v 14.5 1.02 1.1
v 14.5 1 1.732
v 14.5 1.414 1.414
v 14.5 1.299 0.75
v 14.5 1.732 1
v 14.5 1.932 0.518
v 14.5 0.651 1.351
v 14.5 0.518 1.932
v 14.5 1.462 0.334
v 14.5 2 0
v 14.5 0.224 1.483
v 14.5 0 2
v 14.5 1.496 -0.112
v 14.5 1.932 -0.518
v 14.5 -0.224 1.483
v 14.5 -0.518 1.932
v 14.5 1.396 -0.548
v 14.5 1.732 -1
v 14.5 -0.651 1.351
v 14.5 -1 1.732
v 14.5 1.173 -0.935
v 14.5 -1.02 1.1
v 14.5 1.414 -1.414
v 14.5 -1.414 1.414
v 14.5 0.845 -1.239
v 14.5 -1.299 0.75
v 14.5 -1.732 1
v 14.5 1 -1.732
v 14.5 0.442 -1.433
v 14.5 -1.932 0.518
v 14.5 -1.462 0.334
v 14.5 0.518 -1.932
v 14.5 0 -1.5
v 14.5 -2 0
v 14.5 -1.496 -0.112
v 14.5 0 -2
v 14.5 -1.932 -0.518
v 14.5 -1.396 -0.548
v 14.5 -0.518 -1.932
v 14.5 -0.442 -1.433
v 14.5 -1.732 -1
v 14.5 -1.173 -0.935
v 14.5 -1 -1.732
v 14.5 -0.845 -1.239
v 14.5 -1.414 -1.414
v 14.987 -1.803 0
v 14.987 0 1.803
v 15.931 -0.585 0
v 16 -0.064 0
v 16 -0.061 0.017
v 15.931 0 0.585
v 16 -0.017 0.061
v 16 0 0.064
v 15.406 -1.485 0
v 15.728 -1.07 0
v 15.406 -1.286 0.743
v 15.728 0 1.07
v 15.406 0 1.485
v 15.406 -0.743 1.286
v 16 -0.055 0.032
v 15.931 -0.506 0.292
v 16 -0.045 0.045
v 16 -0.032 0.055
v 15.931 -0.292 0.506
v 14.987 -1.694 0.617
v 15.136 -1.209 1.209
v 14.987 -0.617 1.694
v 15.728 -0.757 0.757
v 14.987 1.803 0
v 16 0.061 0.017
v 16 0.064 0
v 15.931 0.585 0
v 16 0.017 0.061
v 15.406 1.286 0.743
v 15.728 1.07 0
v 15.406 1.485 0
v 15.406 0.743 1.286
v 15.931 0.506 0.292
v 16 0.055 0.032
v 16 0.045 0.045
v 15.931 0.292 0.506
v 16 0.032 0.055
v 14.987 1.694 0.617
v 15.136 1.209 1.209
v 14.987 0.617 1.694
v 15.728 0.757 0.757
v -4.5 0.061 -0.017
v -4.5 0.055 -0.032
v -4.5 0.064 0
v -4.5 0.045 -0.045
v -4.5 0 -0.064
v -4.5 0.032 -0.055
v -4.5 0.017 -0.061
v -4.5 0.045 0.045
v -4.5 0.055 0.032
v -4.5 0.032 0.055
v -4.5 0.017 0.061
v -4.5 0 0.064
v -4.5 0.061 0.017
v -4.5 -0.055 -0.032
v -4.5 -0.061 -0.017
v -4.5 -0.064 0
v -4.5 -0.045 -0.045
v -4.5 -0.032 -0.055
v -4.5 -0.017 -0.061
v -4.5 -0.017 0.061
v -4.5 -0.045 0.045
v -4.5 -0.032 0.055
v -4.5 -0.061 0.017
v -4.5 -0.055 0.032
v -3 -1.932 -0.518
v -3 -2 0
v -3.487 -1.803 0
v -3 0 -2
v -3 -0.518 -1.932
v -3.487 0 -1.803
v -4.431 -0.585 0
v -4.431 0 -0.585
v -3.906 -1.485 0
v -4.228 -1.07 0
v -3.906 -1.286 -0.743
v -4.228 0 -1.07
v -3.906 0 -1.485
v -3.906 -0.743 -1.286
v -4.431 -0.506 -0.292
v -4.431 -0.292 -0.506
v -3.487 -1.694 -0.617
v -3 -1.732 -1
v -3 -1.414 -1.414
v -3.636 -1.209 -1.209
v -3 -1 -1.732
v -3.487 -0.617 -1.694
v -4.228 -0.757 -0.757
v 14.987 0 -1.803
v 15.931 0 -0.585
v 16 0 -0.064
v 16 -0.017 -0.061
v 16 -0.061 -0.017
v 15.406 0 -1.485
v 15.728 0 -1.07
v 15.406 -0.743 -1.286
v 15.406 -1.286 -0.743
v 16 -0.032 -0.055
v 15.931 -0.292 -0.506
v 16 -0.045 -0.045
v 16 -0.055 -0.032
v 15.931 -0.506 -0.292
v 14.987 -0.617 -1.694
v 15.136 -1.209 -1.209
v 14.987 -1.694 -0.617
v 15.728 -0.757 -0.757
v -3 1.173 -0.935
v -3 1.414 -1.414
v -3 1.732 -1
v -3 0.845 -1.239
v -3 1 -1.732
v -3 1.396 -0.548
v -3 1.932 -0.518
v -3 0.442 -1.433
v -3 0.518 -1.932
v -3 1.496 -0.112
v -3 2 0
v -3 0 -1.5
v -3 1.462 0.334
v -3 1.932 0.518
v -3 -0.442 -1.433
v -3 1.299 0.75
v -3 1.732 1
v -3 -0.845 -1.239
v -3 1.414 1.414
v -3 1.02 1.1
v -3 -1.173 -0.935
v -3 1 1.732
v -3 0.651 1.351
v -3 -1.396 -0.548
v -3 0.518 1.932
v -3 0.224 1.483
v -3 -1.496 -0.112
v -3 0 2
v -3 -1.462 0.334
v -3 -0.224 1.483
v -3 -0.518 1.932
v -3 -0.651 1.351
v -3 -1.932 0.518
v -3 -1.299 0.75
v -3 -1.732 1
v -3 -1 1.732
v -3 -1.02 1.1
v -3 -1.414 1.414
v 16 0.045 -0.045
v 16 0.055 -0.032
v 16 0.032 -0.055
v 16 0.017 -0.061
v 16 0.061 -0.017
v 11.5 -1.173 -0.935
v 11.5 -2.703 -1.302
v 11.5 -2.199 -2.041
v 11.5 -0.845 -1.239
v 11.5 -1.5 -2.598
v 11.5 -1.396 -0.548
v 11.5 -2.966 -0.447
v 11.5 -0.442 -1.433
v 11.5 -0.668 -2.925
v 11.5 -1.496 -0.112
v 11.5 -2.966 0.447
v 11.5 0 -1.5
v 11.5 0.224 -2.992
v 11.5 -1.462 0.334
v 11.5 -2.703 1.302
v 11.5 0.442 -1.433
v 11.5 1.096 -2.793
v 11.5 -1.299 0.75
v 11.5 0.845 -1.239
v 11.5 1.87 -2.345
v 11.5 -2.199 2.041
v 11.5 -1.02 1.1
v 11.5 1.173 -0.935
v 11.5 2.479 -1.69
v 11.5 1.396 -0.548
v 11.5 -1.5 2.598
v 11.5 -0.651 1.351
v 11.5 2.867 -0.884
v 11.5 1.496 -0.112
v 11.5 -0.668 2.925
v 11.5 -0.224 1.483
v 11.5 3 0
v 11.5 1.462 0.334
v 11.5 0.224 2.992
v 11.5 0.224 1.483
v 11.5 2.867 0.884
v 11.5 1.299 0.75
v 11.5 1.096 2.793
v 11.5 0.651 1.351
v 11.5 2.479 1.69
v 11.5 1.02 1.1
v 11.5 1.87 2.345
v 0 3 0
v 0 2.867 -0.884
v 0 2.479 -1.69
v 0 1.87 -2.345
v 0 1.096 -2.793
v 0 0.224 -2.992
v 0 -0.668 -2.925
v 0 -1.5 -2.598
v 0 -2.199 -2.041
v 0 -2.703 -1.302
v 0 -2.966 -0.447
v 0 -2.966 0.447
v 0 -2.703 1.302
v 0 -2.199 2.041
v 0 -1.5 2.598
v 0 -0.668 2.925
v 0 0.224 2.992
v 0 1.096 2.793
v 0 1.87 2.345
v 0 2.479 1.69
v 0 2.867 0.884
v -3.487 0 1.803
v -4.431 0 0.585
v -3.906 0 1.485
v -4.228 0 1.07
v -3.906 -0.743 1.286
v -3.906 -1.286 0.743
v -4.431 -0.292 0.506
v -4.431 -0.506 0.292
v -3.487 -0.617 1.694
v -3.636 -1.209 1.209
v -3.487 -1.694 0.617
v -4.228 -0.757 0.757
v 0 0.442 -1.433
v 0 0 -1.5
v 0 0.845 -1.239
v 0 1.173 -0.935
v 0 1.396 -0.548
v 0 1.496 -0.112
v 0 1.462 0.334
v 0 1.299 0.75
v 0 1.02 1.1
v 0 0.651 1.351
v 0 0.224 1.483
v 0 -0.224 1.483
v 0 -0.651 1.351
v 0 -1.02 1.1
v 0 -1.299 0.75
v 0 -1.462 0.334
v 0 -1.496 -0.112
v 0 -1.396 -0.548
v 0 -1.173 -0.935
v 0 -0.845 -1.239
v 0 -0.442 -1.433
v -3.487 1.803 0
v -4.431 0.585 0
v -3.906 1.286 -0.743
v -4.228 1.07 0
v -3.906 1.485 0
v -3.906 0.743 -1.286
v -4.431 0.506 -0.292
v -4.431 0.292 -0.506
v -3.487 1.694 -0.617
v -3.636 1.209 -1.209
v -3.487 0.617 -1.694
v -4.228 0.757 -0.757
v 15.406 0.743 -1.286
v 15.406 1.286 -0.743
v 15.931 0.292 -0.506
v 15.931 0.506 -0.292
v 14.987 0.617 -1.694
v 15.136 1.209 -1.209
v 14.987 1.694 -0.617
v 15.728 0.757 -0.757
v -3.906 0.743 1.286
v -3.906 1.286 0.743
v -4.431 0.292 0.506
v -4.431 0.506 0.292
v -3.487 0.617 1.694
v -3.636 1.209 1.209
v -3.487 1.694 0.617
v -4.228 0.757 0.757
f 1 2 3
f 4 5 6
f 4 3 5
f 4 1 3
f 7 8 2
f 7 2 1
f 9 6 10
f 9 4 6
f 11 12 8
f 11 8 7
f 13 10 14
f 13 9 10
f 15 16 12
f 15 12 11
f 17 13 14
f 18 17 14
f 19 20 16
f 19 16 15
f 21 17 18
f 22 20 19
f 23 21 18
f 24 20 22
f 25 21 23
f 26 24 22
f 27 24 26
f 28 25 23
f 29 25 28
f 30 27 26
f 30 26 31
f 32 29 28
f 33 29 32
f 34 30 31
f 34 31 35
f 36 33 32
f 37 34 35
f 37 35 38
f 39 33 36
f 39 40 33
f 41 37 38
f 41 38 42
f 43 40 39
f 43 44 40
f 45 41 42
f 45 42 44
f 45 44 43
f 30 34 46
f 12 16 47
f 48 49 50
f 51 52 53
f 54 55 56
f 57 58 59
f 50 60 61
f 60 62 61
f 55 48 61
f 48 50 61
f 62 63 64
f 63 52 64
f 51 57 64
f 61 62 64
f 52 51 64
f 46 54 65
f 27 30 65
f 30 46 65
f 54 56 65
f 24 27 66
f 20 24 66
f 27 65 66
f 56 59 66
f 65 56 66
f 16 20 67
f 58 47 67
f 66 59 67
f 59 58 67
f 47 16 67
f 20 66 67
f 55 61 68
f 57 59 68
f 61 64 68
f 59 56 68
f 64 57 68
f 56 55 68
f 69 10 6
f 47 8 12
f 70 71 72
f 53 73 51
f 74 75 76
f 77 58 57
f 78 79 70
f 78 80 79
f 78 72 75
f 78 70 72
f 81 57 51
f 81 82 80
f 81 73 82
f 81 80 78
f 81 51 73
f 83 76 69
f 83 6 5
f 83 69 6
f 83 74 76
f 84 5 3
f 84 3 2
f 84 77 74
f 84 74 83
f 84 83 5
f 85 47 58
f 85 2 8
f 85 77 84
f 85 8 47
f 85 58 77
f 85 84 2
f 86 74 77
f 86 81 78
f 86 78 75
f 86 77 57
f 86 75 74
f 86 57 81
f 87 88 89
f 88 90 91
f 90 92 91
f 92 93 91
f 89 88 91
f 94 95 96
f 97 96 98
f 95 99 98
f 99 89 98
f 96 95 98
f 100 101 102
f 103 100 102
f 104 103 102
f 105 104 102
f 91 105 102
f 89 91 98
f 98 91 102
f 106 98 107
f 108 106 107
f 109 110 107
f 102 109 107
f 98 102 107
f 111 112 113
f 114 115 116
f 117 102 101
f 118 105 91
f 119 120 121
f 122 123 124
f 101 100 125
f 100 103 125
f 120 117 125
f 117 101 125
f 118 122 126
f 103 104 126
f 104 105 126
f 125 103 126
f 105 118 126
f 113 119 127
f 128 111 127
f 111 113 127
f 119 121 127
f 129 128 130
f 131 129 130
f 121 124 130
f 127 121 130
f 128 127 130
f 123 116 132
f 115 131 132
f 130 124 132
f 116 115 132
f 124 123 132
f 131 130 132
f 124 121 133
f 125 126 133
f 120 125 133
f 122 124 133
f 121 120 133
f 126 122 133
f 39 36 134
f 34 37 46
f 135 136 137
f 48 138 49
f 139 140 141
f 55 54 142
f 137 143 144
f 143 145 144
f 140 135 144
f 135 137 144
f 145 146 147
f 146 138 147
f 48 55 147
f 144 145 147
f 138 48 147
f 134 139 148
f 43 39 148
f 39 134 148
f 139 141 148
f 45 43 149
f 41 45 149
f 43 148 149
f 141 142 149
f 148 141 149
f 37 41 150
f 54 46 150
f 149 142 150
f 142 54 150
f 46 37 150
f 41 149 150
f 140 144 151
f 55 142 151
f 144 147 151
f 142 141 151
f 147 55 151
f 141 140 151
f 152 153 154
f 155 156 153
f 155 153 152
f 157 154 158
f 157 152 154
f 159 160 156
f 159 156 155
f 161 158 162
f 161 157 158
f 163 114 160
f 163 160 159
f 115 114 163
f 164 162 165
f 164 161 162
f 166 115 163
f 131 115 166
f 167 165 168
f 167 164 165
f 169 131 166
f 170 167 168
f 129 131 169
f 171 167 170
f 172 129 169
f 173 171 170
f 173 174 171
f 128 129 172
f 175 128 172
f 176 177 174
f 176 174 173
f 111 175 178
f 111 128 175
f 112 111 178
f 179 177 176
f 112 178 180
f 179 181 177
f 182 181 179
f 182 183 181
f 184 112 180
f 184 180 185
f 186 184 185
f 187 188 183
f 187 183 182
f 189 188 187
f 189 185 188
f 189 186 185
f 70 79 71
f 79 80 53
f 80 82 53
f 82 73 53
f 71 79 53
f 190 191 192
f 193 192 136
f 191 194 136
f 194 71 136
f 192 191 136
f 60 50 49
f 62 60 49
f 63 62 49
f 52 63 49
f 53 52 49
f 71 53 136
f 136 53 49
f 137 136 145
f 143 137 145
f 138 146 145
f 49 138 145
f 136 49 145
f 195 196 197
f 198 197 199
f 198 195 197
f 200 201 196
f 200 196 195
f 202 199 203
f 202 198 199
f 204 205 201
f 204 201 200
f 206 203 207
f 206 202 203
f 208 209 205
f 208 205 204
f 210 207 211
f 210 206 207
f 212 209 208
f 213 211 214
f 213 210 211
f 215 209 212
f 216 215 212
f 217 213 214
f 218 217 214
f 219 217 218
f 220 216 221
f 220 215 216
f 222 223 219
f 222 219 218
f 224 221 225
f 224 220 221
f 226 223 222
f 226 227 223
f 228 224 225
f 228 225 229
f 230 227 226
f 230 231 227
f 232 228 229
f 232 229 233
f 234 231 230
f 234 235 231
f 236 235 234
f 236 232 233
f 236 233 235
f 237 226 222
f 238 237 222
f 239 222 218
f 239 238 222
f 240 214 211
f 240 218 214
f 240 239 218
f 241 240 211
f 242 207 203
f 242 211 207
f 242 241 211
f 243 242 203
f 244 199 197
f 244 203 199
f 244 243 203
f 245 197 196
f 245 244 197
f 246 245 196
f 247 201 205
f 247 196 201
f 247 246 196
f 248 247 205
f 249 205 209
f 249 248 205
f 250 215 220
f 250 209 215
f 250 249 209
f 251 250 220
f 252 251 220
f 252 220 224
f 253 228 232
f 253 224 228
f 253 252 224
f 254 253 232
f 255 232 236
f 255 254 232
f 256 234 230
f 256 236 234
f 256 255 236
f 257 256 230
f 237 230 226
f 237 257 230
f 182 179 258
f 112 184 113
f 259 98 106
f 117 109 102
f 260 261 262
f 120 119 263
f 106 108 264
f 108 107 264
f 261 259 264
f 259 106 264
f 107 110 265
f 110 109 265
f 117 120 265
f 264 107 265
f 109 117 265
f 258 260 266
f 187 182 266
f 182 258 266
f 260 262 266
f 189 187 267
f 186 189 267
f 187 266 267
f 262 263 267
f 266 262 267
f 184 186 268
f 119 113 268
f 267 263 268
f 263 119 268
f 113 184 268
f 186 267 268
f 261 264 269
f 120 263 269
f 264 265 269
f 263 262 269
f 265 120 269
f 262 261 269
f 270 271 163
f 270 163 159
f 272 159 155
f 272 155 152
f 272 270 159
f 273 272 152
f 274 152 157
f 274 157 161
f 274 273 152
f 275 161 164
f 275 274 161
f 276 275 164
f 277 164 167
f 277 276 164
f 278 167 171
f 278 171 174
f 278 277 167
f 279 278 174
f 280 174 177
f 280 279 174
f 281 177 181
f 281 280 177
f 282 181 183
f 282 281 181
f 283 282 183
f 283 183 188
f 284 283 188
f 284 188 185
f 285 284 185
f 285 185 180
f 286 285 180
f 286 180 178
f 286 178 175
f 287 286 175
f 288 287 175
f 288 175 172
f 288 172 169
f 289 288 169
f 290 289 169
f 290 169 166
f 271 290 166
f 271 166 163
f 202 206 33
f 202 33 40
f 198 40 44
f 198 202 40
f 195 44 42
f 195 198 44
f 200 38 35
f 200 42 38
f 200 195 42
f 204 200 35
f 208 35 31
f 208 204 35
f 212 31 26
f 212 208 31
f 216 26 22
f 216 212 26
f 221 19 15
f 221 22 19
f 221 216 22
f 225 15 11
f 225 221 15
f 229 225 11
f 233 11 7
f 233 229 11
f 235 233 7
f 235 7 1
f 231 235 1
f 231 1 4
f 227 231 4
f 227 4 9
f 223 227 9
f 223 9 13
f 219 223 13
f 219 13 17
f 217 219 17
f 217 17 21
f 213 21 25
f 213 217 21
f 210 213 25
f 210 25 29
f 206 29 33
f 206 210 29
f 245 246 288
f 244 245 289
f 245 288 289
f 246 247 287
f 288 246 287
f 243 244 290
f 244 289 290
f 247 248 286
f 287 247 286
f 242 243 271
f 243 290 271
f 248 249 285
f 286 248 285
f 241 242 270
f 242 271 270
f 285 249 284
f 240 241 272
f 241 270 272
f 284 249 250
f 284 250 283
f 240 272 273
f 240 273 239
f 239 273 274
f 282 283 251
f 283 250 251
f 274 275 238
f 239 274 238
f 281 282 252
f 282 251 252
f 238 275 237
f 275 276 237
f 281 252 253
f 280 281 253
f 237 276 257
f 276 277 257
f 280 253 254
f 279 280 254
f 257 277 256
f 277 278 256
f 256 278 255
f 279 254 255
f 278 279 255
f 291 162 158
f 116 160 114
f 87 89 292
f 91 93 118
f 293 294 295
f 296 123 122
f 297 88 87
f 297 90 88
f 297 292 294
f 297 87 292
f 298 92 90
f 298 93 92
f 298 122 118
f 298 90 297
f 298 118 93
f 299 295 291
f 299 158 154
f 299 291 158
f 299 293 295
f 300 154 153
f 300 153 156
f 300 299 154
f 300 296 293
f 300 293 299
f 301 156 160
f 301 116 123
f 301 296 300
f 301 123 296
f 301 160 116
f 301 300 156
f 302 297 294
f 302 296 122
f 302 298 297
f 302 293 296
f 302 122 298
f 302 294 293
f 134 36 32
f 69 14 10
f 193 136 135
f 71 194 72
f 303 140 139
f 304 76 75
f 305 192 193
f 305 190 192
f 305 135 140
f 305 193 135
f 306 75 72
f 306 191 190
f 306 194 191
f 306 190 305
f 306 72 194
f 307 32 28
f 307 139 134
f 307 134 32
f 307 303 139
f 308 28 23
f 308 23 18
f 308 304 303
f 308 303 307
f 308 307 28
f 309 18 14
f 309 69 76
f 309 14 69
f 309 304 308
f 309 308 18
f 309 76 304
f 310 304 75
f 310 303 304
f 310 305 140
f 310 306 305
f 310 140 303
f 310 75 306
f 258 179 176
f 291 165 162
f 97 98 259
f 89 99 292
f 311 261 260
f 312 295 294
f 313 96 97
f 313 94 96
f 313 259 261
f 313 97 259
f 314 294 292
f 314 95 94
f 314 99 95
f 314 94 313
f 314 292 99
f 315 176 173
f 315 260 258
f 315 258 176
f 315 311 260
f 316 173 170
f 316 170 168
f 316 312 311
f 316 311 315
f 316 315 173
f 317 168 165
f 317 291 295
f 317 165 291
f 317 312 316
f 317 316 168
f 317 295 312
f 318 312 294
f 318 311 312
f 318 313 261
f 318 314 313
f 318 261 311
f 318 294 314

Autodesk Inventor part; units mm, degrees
ref_plane "XZ Plane" through (0, 0, 0) normal (0, 1, 0) x (-1, 0, 0)
ref_plane "XY Plane" through (0, 0, 0) normal (0, 0, 1) x (1, 0, 0)
sketch "Sketch1" plane through (0, 0, 0) normal (1, 0, 0) x (0, 1, 0)
  circle A0 centre (0, 0) radius 3
  dimension "d0" = 6
extrude "Extrusion1" add sketch "Sketch1" along normal blind 11.5
sketch "Sketch2" plane through (11.5, 0, 0) normal (1, 0, 0) x (0, 0, -1)
  circle A0 centre (0, 0) radius 1.5
  dimension "d3" = 3
extrude "Extrusion2" add sketch "Sketch2" along normal blind 3
sketch "Sketch3" plane through (0, 0, 0) normal (0, 1, 0) x (-1, 0, 0)
  line L0 (-14.5, 1.5) -> (-14.5, -1.5) projected
  line L1 (-14.5, 0) -> (-14.5, 2)
  line L2 (-14.5, 0) -> (-14.5, -2)
  line L3 (-14.5, -2) -> (-16, -2)
  line L4 (-14.5, 2) -> (-16, 2)
  line L5 (-16, 2) -> (-16, -2)
  point P0 (0, 0)
  dimension "d6" = 2
  dimension "d7" = 2
  dimension "d8" = 1.5
extrude "Extrusion3" add sketch "Sketch3" along normal mid plane 4
fillet "Fillet1" radius 2 4 edges at (15.25, 2, -2) (15.25, 2, 2) (15.25, -2, 2) (15.25, -2, -2)
fillet "Fillet2" radius 2 3 edges at (16, 0, -2) (16, 1.4142, -1.4142) (16, 2, 0)
ref_plane "Work Plane1" through (5.75, 0, 0) normal (1, 0, 0) x (0, 1, 0)
mirror "Mirror1" about plane through (5.75, 0, 0) normal (1, 0, 0) of "Extrusion2"
sketch "Sketch4" plane through (0, 0, 0) normal (0, 1, 0) x (-1, 0, 0)
  line L0 (3, 1.5) -> (3, -1.5) projected
  line L1 (3, 0) -> (3, 2)
  line L2 (3, 2) -> (3, -2)
  line L3 (3, -2) -> (4.5, -2)
  line L4 (4.5, -2) -> (4.5, 2)
  line L5 (4.5, 2) -> (3, 2)
  point P0 (0, 0)
  dimension "d14" = 2
  dimension "d15" = 4
  dimension "d16" = 1.5
extrude "Extrusion4" add sketch "Sketch4" along normal mid plane 4
fillet "Fillet3" radius 2 4 edges at (-3.75, 2, 2) (-3.75, 2, -2) (-3.75, -2, 2) (-3.75, -2, -2)
fillet "Fillet4" radius 2 3 edges at (-4.5, 0, 2) (-4.5, 2, 0) (-4.5, 1.4142, 1.4142)
properties part number "Reverse Gear LInk Rod" material "Copper"
